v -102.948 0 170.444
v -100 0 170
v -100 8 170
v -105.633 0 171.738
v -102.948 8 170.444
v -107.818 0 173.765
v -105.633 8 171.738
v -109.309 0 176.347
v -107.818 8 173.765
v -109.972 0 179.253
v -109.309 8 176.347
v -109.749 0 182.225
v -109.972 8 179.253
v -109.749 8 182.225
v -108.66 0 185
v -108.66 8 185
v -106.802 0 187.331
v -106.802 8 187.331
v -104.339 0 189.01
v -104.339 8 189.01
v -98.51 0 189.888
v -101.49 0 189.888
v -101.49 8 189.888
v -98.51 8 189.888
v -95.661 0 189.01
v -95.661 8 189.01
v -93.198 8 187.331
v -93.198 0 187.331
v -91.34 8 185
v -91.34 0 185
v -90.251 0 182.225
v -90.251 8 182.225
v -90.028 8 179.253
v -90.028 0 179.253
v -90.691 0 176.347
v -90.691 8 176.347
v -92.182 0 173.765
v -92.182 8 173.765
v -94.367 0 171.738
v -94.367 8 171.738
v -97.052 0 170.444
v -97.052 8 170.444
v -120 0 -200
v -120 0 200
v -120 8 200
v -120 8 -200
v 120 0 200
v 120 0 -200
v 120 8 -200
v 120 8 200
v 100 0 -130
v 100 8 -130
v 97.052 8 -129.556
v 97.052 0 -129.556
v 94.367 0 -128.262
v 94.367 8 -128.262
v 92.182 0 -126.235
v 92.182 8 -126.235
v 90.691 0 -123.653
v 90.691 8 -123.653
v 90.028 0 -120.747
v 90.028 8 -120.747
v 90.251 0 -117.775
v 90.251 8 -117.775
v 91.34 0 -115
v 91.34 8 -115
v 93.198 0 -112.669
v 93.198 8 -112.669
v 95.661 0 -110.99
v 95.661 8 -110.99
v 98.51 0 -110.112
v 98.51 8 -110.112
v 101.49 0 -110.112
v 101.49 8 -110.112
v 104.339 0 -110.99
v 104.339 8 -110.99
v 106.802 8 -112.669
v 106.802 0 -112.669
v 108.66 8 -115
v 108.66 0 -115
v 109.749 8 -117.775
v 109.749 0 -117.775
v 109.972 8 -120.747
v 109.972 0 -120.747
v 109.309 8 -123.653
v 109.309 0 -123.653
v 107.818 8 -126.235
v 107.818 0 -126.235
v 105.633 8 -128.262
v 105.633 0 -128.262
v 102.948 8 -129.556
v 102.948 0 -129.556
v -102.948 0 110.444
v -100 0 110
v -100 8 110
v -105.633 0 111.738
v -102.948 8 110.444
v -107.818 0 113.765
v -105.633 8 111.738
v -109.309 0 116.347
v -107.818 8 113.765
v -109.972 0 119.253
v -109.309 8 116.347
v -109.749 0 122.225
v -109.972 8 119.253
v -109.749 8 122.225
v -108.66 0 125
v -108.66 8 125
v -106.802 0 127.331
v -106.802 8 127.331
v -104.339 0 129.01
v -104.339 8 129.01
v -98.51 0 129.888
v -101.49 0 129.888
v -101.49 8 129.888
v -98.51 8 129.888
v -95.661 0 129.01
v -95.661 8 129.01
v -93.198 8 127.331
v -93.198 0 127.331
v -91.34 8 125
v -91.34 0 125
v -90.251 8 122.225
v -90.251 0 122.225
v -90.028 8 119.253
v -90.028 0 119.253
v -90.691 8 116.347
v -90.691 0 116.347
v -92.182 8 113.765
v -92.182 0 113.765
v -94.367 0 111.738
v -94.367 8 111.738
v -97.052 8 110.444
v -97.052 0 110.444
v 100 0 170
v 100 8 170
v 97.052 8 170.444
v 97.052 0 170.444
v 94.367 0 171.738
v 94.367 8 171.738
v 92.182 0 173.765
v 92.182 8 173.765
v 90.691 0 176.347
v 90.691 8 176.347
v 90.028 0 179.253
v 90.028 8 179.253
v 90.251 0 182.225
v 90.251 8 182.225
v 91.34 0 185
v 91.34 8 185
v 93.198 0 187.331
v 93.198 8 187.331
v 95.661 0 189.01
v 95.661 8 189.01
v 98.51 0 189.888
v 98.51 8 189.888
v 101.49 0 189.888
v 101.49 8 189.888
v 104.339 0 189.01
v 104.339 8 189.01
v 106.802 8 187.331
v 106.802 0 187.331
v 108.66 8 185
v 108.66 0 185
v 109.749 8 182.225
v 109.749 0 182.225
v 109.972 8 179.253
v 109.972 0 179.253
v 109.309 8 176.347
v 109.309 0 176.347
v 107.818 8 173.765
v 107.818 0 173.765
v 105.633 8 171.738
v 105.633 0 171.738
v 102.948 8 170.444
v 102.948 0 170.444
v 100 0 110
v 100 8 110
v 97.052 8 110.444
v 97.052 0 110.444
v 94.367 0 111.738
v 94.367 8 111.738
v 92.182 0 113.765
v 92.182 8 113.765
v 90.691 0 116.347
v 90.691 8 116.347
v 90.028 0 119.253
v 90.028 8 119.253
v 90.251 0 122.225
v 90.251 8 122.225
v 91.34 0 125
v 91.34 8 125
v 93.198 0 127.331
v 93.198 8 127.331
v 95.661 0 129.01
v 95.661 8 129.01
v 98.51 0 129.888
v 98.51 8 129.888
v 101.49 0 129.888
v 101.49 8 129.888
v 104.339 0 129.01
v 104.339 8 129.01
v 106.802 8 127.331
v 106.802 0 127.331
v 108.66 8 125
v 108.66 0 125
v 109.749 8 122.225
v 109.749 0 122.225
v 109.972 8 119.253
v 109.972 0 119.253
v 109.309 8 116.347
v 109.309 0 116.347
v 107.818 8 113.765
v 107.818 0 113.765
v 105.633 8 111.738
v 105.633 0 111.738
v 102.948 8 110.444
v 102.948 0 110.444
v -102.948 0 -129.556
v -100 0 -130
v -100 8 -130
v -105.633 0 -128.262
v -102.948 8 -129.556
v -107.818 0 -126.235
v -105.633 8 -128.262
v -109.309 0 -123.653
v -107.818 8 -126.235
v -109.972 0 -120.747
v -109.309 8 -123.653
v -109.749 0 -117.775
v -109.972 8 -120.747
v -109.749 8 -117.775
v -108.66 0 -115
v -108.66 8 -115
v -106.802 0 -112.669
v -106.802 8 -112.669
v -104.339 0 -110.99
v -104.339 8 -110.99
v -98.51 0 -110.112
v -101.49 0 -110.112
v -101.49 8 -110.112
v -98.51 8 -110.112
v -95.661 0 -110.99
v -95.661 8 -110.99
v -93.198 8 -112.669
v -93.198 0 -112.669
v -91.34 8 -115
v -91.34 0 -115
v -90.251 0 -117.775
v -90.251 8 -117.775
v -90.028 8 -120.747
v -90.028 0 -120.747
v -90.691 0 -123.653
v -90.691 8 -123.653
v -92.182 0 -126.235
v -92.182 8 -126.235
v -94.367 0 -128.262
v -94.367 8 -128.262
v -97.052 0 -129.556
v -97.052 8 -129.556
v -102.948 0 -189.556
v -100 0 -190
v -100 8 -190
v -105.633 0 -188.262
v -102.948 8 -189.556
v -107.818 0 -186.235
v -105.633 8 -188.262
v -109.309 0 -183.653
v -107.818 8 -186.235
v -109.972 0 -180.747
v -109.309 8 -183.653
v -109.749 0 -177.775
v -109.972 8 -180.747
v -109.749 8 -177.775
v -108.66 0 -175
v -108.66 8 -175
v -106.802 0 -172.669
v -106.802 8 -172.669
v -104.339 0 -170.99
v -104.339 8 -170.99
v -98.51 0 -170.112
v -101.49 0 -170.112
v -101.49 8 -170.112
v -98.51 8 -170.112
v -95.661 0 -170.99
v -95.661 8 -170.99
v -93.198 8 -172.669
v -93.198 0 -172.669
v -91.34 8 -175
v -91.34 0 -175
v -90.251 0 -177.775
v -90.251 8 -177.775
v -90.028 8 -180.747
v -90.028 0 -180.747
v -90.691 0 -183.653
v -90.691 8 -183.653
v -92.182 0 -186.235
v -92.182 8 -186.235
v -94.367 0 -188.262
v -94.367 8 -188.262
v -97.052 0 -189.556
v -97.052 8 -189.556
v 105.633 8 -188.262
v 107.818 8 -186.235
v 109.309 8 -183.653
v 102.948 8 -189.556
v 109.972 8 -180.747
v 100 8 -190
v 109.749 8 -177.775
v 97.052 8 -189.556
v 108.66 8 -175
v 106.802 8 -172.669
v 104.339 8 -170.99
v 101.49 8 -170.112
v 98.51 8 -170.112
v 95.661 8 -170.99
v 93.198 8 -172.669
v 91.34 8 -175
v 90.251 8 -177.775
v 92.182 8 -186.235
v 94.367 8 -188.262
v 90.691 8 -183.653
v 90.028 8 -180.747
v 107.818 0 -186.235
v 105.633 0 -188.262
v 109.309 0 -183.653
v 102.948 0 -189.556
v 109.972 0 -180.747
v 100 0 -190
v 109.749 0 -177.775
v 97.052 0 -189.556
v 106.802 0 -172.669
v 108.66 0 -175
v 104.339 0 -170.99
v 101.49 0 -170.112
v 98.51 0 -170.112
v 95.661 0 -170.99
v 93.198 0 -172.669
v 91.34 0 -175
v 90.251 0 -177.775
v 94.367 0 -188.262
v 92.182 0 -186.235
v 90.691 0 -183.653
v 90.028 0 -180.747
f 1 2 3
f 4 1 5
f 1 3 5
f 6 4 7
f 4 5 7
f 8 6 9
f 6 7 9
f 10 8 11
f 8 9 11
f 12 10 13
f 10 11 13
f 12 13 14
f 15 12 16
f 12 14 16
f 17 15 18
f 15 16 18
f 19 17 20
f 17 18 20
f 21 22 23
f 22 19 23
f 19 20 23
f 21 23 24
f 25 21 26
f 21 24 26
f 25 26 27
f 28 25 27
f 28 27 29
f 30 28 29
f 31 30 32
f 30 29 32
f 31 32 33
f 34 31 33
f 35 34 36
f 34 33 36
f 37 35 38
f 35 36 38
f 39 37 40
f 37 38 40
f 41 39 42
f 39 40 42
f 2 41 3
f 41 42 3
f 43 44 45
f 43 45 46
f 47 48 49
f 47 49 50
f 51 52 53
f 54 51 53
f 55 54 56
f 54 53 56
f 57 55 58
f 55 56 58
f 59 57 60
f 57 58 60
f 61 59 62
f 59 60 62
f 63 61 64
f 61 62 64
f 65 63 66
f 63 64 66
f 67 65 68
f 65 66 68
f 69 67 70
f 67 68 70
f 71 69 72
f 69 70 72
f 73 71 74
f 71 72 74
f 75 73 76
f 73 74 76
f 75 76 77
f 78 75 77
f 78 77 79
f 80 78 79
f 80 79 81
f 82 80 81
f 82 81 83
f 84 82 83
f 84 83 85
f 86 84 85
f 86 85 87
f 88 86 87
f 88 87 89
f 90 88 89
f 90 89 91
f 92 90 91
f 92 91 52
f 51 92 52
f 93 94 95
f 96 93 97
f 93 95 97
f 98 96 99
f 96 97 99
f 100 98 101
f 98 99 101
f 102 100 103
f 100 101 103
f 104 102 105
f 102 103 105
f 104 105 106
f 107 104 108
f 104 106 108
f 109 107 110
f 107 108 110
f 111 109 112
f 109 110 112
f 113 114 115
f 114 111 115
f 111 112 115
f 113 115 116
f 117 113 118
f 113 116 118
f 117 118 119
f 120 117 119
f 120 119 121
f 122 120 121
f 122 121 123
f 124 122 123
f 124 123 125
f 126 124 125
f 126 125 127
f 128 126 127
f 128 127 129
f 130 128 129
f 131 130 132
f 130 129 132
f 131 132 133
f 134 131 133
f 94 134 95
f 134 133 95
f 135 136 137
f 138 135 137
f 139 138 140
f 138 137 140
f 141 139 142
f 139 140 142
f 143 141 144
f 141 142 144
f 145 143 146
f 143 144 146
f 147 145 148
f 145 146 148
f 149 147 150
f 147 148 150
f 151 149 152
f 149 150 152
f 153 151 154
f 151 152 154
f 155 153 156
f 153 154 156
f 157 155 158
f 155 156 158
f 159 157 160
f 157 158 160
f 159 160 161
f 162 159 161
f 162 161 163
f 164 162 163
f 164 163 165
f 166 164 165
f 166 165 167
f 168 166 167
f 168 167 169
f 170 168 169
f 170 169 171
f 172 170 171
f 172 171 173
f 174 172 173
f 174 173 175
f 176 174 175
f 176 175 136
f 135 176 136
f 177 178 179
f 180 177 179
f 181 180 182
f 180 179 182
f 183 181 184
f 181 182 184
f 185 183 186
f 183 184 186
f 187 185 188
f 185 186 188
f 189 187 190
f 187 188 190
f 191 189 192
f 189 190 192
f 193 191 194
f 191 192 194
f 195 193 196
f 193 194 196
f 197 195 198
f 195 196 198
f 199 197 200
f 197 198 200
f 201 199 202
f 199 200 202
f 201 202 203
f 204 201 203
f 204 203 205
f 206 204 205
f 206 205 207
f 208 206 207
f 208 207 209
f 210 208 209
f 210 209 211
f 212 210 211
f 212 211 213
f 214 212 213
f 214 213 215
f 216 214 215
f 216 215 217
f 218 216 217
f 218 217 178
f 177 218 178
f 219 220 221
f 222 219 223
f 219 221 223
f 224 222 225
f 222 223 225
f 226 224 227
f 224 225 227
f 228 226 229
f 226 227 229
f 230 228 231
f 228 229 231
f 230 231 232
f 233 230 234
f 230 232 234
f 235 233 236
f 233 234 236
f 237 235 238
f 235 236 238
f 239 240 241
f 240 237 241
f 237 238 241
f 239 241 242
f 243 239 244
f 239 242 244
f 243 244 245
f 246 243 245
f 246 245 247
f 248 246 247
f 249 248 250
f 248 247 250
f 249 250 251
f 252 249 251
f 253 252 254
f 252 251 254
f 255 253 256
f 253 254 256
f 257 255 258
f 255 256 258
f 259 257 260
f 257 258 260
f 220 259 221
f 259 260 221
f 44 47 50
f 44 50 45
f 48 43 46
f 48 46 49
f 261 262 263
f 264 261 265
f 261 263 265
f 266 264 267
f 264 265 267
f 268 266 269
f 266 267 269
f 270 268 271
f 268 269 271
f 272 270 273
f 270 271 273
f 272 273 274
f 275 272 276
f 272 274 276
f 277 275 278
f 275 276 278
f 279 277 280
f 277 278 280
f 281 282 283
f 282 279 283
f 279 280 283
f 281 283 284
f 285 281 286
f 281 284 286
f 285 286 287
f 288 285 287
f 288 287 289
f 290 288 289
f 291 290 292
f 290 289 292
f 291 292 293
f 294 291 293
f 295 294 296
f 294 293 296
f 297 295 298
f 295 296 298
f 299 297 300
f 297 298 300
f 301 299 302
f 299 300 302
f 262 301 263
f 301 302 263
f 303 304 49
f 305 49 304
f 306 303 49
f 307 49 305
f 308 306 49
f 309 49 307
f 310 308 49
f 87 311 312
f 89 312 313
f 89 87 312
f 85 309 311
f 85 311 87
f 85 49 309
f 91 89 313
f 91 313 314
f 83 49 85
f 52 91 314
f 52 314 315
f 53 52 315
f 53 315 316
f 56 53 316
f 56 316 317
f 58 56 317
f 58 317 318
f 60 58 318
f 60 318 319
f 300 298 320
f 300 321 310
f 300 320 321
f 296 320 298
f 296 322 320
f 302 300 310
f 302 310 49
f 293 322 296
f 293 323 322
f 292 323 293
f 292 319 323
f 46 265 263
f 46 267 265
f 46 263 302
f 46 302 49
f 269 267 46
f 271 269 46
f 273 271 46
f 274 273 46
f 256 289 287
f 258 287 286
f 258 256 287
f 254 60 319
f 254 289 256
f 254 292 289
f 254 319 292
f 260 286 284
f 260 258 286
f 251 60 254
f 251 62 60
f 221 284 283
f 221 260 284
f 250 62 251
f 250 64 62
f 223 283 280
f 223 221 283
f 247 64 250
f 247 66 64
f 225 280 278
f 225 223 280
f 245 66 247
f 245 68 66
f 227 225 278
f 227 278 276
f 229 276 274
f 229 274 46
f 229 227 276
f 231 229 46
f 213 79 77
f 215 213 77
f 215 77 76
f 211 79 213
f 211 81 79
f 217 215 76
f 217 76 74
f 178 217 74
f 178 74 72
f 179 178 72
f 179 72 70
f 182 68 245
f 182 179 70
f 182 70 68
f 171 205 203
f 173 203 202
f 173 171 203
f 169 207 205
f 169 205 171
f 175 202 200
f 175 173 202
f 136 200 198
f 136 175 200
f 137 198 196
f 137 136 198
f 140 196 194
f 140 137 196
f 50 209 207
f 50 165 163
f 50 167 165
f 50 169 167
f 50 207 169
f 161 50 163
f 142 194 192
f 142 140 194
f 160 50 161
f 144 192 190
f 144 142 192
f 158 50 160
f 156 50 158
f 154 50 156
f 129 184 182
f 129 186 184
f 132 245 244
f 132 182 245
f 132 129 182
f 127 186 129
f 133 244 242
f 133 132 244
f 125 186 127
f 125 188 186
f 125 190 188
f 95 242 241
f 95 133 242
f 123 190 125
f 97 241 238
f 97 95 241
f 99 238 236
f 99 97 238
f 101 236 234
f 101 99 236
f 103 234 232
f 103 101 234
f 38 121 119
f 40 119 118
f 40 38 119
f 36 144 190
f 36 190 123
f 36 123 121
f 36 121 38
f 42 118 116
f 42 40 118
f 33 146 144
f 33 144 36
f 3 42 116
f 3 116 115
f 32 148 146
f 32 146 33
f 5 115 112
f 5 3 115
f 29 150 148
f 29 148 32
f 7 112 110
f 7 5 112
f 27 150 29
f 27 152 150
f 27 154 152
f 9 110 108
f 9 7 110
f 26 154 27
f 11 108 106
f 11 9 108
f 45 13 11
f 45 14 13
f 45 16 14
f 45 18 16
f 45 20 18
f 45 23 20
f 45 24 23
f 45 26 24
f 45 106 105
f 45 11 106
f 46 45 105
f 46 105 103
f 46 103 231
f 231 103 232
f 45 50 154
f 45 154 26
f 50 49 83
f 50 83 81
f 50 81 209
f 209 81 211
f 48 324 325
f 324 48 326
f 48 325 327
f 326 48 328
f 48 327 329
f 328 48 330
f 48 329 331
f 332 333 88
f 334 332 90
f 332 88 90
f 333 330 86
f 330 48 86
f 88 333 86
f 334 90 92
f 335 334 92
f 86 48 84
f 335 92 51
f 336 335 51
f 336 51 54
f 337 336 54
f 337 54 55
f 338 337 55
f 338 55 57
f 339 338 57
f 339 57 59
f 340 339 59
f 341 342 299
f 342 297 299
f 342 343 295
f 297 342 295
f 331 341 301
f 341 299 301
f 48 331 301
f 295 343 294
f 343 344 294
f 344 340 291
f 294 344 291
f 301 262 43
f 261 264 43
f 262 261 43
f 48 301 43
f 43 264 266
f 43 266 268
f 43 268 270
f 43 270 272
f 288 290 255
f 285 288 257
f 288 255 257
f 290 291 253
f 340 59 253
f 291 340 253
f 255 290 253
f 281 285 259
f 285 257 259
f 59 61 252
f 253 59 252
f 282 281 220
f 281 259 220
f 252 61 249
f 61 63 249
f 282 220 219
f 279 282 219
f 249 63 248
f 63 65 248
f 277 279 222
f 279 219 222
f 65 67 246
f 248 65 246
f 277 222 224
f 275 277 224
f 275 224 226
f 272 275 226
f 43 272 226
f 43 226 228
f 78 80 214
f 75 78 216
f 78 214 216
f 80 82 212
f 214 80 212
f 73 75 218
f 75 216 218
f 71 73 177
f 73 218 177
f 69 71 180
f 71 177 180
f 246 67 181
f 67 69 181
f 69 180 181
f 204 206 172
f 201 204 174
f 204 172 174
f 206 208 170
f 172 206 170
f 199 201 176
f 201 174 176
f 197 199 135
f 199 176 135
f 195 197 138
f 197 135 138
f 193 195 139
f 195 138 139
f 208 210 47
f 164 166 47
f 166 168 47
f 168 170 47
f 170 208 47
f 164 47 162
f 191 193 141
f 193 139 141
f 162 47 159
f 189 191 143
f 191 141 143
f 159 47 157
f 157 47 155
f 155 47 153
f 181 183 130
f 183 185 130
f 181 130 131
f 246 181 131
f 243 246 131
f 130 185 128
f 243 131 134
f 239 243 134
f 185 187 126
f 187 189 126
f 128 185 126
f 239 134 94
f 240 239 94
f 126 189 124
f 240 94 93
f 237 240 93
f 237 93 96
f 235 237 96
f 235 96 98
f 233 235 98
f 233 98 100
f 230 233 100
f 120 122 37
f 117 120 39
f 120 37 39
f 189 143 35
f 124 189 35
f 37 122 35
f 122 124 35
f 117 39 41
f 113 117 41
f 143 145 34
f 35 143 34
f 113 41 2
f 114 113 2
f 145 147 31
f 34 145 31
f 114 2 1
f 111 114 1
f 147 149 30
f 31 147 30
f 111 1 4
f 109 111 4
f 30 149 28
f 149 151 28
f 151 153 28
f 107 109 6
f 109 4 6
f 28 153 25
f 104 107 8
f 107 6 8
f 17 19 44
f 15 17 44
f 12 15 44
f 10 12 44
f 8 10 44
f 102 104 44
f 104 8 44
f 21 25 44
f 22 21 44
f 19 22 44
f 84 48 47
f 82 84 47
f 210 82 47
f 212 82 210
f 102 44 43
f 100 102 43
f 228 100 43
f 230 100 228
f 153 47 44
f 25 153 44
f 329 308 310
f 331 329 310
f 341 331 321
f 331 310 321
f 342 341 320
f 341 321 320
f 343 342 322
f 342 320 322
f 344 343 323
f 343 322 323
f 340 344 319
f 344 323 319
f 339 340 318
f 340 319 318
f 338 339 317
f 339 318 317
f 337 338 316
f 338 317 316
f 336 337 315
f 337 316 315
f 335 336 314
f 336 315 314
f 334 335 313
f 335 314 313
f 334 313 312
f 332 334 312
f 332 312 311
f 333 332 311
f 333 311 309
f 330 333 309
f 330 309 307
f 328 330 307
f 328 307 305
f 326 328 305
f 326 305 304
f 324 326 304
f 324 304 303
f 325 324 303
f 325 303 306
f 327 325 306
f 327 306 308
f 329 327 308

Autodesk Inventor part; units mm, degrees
ref_plane "YZ Plane" through (0, 0, 0) normal (1, 0, 0) x (0, 1, 0)
ref_plane "XZ Plane" through (0, 0, 0) normal (0, 1, 0) x (-1, 0, 0)
ref_plane "XY Plane" through (0, 0, 0) normal (0, 0, 1) x (1, 0, 0)
sketch "Sketch1" plane through (0, 0, 0) normal (0, 1, 0) x (-1, 0, 0)
  line L0 (120, -200) -> (-120, -200)
  line L1 (-120, -200) -> (-120, 200)
  line L2 (-120, 200) -> (120, 200)
  line L3 (120, 200) -> (120, -200)
  line L4 (120, -200) -> (-120, 200) construction
  line L5 (-120, -200) -> (120, 200) construction
  point P0 (0, 0)
  point P1 (0, 0)
  dimension "d16" = 240
  dimension "d17" = 400
extrude "Plate1" add sketch "Sketch1" along normal blind 8
sketch "Sketch2" plane through (0, 0, 0) normal (0, -1, 0) x (1, 0, 0)
  line L0 (100, 180) -> (100, -180) construction
  line L1 (-120, -200) -> (120, -200) projected
  line L2 (120, -200) -> (120, 200) projected
  line L3 (120, 200) -> (-120, 200) projected
  line L4 (-120, 200) -> (-120, -200) projected
  point P0 (100, 0)
  point P1 (100, 0)
  point P2 (0, 0)
  point P3 (100, 120)
  point P4 (100, -120)
  dimension "d19" = 20
  dimension "d20" = 20
  dimension "d21" = 360
  dimension "d22" = 120
  dimension "d23" = 120
hole "Hole1" at (100, 0, 180) at (100, 0, -180) at (100, 0, -120) at (100, 0, 120) direction (0, 1, 0) diameter 20 end through all
mirror "Mirror1" about plane through (0, 0, 0) normal (1, 0, 0) of "Hole1"
equation "\"d20\" = d19"
equation "\"d23\" = d22"
equation "\"d3\" = d19"
equation "\"d8\" = Thickness"
equation "\"d2\" = Thickness"
equation "\"BendRadius\" = Thickness"
equation "\"BendReliefWidth\" = Thickness"
equation "\"BendReliefDepth\" = 0.5 * Thickness"
equation "\"CornerReliefSize\" = 4 * Thickness"
equation "\"MinimumRemnant\" = 2 * Thickness"
equation "\"TransitionRadius\" = BendRadius"
equation "\"JacobiRadiusSize\" = BendRadius"
equation "\"GapSize\" = Thickness"
equation "\"Thickness\" = 8"
properties part number "Ухо на швеллер пямое"
